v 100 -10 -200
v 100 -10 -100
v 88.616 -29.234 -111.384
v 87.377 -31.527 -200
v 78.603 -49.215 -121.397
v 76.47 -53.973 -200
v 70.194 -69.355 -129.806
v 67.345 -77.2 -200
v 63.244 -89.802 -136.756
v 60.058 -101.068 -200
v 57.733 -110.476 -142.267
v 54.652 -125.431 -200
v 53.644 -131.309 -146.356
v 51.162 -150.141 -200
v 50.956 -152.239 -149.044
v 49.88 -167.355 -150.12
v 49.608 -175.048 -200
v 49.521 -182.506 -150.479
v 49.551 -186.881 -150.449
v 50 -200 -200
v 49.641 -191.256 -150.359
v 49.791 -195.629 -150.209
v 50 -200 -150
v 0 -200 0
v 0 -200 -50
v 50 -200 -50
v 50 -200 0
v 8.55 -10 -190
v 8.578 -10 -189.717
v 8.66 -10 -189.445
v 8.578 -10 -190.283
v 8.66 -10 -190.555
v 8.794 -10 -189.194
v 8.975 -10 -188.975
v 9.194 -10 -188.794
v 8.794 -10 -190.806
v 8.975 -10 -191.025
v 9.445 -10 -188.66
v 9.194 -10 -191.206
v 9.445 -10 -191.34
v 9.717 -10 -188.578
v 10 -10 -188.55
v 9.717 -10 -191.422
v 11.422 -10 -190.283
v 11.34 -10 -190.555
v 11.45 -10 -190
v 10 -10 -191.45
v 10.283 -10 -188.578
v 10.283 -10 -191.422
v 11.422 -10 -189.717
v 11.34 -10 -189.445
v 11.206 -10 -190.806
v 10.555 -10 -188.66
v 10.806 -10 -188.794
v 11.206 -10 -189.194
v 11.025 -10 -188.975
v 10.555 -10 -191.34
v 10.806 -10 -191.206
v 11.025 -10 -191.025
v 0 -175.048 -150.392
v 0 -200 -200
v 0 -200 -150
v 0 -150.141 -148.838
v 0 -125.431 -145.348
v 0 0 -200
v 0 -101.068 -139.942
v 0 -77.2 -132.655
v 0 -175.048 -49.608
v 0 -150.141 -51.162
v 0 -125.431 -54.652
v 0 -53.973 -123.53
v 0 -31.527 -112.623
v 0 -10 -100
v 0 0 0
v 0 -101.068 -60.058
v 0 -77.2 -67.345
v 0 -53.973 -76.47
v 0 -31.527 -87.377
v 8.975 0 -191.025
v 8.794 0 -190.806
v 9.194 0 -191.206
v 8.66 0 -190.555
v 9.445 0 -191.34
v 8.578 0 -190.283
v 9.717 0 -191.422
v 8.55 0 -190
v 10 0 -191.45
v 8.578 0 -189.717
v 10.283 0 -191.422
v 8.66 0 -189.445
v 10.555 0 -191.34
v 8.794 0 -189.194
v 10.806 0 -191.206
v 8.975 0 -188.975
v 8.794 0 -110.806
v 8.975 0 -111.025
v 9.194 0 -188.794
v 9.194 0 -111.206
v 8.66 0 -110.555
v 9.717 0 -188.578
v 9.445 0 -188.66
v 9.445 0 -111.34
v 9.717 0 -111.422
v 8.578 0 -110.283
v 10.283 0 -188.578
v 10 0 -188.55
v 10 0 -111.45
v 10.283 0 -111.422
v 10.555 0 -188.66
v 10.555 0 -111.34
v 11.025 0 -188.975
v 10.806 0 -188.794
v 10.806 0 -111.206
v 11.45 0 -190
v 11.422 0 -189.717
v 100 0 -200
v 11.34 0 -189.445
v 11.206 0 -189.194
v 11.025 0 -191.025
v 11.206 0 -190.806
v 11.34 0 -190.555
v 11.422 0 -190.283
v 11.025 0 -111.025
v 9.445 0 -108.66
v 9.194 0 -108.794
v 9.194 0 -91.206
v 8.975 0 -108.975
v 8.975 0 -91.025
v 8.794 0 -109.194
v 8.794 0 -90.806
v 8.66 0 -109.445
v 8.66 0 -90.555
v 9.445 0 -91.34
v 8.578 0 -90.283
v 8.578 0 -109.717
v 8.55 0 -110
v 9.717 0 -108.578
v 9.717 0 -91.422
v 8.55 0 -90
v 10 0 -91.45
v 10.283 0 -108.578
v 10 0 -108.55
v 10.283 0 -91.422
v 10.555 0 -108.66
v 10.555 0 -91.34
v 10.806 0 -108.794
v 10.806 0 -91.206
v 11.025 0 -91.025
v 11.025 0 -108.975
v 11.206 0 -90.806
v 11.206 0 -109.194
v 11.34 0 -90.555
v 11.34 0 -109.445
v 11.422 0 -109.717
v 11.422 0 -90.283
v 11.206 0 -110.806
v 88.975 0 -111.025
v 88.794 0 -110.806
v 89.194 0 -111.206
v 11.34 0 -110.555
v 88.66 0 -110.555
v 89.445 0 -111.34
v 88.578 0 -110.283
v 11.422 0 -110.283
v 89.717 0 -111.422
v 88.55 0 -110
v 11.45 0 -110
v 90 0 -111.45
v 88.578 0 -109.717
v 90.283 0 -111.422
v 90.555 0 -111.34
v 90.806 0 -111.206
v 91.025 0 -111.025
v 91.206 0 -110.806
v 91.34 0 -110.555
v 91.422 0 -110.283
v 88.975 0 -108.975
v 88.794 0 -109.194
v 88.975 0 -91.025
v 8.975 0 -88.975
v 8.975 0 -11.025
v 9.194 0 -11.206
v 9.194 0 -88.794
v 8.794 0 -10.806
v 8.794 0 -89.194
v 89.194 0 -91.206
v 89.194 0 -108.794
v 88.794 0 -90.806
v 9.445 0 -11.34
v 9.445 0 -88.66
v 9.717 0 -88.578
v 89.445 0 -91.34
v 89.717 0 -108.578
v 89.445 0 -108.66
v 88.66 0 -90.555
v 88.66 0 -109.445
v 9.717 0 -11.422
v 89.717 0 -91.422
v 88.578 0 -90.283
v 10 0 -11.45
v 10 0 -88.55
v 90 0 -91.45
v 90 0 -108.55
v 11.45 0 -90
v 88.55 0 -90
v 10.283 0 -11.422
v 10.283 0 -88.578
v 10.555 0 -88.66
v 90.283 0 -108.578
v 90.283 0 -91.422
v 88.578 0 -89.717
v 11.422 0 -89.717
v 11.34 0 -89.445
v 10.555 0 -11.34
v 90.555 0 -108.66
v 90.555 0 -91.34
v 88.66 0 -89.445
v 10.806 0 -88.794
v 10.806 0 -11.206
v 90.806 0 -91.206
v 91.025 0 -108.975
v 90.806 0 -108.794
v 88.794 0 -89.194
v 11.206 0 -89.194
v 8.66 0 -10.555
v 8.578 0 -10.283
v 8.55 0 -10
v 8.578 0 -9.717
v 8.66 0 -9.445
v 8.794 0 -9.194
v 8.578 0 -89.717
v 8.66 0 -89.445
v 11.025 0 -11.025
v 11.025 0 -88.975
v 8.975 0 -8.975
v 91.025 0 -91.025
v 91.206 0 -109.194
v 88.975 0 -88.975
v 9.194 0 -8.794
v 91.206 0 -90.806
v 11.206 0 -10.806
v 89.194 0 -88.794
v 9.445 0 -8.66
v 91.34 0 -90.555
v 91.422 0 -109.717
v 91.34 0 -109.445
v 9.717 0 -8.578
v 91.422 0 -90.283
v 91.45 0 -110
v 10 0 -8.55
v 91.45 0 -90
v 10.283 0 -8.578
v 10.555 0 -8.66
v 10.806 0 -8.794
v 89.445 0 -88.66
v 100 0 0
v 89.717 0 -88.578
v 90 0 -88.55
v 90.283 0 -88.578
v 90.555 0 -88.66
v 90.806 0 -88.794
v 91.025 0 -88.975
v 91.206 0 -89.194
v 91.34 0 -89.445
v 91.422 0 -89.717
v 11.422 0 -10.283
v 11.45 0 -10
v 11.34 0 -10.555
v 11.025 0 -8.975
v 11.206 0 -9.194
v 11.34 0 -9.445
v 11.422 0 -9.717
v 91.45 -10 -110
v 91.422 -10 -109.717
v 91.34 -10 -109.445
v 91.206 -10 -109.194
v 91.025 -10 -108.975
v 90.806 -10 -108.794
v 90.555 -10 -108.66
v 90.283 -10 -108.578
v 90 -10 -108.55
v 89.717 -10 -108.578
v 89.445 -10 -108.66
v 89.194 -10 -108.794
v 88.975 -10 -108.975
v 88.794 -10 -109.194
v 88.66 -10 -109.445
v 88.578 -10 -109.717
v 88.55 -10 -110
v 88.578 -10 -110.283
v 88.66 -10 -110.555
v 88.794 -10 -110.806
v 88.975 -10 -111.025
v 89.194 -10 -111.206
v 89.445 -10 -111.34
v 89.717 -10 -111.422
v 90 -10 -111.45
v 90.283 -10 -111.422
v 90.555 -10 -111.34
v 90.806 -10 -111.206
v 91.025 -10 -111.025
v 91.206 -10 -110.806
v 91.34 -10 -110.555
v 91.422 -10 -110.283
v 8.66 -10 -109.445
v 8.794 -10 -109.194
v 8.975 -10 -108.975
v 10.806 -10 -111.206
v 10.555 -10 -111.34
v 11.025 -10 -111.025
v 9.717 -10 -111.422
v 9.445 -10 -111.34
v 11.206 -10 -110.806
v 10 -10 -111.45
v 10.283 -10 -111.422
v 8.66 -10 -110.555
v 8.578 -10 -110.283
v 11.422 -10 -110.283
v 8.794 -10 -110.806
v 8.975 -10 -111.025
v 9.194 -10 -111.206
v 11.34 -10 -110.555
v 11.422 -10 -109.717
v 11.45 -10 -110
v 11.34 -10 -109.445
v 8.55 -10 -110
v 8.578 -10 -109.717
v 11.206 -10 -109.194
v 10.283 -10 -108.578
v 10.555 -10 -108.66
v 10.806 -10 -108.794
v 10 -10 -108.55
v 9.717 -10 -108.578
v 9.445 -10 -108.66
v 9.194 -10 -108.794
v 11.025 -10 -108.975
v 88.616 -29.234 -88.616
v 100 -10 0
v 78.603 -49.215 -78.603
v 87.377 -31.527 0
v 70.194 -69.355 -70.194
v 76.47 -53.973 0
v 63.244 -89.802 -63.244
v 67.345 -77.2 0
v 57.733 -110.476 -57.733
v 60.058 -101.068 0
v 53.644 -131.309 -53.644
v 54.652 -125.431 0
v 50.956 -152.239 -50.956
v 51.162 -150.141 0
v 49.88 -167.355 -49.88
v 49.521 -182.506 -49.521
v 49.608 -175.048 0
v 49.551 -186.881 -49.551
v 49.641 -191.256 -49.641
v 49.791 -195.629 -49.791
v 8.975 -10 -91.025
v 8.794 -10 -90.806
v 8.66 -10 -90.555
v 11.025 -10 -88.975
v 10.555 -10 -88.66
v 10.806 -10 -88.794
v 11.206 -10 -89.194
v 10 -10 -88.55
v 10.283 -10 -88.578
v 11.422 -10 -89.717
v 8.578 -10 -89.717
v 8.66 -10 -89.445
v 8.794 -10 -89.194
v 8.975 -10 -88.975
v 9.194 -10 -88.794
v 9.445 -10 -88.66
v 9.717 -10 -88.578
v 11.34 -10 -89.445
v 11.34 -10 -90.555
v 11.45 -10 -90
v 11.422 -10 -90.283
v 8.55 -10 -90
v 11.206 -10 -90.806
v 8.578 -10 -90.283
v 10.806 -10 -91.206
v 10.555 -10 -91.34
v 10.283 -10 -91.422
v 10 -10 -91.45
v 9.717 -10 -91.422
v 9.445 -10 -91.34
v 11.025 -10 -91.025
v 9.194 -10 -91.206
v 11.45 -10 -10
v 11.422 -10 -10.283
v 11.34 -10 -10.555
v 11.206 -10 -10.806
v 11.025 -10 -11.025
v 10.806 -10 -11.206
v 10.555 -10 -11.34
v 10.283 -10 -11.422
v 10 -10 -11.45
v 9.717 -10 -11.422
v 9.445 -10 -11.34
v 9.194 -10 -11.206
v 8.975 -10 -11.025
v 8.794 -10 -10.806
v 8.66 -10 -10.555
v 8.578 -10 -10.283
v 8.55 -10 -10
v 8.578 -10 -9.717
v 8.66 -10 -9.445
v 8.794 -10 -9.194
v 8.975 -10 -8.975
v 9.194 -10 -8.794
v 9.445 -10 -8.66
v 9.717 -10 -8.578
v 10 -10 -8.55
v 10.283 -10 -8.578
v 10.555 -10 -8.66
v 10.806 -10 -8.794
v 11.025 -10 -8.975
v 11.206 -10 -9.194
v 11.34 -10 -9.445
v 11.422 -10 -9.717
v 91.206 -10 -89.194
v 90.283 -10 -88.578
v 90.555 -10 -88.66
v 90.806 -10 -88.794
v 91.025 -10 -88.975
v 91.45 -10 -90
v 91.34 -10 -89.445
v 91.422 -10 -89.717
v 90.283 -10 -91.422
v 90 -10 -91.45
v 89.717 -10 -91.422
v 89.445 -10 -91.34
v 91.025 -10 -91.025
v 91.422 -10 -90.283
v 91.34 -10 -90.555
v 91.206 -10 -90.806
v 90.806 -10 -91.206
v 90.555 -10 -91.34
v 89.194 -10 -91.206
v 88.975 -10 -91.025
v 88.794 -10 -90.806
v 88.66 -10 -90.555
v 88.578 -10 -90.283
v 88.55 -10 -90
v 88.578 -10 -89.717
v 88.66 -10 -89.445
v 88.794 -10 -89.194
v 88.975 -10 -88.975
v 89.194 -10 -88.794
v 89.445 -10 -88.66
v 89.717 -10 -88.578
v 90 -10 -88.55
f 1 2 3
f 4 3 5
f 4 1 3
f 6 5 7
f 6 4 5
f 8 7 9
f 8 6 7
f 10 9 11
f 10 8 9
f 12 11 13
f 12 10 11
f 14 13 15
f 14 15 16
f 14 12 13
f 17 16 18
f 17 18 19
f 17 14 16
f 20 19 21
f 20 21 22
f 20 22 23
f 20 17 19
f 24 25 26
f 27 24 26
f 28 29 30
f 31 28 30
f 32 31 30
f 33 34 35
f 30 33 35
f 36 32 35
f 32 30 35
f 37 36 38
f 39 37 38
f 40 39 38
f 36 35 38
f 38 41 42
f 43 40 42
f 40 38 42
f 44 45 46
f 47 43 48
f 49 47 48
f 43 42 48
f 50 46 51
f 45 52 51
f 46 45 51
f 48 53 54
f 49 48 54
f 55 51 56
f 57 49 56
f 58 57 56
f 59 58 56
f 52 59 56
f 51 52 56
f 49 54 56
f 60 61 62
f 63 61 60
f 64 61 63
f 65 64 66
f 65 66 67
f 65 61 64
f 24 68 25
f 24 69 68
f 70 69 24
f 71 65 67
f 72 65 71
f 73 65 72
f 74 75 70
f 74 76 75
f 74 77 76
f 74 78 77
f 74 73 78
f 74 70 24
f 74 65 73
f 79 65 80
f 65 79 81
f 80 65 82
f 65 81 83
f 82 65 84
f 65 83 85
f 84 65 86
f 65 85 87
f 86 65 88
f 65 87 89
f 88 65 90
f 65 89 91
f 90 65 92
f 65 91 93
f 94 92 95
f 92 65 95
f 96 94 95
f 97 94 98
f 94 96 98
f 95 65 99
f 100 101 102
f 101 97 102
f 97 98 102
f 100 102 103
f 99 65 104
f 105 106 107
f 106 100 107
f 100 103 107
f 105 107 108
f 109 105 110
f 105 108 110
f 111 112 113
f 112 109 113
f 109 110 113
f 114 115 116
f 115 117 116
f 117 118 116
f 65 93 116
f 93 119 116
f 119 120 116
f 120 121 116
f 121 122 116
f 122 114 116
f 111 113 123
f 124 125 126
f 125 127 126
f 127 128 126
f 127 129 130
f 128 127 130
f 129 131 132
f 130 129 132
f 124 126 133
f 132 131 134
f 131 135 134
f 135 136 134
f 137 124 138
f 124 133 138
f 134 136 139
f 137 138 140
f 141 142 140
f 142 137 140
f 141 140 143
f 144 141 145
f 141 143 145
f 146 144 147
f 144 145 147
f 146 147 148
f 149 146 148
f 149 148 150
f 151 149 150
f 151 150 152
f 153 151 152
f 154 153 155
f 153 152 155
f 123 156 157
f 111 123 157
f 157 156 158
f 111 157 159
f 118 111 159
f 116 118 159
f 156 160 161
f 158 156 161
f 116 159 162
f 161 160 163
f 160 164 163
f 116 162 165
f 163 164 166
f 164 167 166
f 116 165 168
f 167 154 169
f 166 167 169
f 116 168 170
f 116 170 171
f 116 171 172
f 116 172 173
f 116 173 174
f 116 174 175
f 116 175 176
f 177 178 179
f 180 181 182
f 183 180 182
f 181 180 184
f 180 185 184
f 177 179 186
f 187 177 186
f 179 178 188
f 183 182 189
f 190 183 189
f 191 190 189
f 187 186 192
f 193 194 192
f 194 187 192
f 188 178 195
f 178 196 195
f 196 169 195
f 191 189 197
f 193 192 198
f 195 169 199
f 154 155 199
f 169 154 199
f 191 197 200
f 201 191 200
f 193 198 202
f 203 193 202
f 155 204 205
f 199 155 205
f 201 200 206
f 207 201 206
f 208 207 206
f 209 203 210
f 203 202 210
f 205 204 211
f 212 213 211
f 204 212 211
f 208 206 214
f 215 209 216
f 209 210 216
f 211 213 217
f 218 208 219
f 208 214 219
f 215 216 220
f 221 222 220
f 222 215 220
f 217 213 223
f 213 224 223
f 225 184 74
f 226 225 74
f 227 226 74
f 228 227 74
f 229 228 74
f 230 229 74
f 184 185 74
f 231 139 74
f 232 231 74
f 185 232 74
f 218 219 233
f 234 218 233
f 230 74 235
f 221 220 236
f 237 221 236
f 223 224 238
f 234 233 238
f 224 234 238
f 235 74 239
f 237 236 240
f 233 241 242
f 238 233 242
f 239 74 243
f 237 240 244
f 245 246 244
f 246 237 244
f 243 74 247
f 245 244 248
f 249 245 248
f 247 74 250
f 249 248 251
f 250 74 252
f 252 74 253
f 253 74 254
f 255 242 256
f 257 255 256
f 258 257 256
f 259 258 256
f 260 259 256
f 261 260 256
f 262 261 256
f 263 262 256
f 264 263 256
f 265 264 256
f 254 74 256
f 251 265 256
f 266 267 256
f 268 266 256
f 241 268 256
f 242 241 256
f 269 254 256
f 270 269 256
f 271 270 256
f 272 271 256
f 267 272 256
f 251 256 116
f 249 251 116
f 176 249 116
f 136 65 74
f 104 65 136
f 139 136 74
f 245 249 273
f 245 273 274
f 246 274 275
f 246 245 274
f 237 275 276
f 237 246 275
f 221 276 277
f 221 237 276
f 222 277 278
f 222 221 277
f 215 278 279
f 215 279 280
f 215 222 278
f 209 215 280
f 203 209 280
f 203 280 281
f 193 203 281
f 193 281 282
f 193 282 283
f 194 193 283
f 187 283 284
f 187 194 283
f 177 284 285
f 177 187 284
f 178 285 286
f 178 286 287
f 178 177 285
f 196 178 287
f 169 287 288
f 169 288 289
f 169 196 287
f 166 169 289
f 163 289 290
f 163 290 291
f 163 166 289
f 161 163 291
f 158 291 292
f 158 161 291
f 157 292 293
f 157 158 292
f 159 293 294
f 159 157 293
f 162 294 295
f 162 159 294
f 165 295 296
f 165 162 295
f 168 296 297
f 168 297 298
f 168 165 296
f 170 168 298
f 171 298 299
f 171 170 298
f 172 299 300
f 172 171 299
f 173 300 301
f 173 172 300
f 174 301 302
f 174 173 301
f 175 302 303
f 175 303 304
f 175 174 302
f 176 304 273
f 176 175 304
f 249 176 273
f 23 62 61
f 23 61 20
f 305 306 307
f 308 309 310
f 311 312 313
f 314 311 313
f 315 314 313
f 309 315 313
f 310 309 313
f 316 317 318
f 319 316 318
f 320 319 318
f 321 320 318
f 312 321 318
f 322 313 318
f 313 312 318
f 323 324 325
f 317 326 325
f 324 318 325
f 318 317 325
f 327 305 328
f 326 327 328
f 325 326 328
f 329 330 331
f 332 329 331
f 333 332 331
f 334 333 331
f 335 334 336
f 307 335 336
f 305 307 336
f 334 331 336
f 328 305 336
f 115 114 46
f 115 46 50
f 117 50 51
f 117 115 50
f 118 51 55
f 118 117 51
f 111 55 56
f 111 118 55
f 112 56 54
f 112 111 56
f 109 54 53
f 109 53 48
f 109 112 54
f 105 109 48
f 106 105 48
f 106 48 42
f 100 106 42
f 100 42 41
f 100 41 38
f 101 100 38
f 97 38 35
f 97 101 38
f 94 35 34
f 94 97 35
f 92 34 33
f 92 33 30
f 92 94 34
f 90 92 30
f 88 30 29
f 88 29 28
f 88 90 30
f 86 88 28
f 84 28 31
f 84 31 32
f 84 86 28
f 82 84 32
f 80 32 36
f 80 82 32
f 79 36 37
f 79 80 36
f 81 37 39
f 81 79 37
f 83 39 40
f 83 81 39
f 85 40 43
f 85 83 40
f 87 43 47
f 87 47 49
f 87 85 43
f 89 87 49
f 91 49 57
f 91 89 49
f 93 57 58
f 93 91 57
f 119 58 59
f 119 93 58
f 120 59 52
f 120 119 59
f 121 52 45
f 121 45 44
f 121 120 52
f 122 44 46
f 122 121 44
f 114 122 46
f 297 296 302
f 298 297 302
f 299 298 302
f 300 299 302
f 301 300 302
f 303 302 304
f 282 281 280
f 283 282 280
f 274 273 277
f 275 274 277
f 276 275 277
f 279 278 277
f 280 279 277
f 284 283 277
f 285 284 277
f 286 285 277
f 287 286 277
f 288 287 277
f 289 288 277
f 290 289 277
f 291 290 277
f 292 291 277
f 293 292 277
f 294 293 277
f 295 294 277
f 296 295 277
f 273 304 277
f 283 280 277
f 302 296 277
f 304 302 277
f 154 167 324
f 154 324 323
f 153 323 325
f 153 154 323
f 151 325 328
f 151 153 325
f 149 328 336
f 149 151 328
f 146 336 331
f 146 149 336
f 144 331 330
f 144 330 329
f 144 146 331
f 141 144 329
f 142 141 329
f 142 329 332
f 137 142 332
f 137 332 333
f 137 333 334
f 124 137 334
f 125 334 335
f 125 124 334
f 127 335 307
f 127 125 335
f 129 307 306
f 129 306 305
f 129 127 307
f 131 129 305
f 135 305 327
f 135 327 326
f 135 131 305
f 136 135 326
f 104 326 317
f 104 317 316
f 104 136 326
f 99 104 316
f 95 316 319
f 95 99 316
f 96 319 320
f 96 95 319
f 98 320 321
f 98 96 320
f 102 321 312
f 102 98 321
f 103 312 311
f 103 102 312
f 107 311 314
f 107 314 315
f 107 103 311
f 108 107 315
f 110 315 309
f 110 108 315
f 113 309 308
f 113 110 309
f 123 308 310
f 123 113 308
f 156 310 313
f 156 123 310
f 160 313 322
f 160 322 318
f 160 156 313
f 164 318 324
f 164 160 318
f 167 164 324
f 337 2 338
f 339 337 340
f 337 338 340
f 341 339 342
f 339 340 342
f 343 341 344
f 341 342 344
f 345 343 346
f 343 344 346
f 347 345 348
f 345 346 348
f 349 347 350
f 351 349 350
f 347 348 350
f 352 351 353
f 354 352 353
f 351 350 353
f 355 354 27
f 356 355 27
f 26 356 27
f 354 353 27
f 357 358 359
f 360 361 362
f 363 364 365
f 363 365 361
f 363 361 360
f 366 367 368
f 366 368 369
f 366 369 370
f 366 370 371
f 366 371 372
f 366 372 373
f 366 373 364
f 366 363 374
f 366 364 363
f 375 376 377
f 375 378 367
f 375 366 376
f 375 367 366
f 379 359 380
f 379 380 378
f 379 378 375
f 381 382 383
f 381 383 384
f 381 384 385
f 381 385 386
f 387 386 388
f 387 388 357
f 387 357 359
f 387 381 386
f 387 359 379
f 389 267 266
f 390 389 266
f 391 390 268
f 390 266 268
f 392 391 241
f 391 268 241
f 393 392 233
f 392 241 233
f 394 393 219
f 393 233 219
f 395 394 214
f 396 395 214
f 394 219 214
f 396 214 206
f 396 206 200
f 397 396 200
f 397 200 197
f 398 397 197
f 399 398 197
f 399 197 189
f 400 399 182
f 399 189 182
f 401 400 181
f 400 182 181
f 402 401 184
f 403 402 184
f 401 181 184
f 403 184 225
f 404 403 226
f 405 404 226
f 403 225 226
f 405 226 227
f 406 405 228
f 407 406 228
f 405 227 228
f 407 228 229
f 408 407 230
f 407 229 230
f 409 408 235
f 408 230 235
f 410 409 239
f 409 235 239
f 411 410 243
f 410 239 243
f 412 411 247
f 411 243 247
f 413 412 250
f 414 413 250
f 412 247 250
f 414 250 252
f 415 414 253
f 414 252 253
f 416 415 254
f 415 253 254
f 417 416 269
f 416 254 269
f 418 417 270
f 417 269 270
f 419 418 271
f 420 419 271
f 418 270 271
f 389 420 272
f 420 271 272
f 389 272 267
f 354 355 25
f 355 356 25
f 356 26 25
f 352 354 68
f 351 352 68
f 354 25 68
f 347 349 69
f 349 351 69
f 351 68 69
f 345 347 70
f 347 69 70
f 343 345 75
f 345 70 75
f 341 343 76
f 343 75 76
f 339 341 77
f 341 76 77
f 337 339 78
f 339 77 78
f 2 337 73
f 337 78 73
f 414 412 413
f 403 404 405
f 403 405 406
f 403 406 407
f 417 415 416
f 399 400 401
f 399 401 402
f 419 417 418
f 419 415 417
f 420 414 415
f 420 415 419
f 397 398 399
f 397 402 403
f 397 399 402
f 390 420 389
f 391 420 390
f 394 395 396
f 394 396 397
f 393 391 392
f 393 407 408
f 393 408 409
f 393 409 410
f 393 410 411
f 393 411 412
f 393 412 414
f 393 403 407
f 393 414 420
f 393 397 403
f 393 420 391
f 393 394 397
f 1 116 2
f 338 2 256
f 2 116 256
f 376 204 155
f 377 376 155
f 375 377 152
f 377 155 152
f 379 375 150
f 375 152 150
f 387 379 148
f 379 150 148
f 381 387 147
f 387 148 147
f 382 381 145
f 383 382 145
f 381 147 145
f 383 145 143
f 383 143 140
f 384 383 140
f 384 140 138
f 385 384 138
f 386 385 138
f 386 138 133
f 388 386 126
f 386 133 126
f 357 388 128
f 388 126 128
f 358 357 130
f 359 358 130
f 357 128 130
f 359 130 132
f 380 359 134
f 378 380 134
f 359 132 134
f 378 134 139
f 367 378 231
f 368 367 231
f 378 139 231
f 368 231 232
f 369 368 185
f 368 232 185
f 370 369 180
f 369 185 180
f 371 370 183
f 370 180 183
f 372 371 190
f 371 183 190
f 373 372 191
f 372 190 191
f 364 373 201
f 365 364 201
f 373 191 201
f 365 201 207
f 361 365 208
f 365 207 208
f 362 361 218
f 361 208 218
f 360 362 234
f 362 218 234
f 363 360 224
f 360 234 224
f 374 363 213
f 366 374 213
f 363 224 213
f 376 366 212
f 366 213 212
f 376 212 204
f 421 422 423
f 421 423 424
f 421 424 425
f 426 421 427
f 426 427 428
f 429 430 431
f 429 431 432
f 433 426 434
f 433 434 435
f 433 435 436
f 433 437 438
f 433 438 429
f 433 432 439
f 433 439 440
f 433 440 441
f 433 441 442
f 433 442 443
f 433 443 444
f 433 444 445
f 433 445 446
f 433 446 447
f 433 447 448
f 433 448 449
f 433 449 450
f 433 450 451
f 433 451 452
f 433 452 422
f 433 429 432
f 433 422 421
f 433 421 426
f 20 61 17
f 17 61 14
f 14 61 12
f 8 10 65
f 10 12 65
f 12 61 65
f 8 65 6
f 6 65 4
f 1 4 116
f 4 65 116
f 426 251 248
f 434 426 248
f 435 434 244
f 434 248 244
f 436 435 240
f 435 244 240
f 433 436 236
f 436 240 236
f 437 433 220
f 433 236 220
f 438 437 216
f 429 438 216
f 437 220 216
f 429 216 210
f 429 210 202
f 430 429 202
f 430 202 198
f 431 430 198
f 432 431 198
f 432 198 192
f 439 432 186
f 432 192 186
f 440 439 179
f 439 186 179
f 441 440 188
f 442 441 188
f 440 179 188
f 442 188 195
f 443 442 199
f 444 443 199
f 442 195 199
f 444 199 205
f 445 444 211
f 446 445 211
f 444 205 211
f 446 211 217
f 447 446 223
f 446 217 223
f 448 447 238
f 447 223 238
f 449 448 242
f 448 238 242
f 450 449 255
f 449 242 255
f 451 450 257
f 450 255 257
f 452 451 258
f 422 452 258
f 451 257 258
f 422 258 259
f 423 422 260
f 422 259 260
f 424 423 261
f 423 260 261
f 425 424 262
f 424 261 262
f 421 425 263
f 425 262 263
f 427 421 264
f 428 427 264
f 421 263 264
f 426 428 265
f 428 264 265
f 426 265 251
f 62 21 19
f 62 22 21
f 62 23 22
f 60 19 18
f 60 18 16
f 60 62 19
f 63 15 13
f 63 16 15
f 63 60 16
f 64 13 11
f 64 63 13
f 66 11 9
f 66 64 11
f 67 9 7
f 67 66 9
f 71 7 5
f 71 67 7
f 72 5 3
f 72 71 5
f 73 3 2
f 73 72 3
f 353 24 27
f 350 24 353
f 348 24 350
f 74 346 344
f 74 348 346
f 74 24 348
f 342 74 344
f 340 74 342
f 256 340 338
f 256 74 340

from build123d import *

# Parameters (mm, degrees)
SKETCH1_W           = 100
SKETCH1_H           = 100
BOSS_EXTRUDE1_DEPTH = 200
CUT_EXTRUDE1_DEPTH  = 200
CUT_EXTRUDE2_DEPTH  = 200
SKETCH4_R           = 1.45
CUT_EXTRUDE3_DEPTH  = 10


with BuildPart() as part:
    # Sketch1 → Boss-Extrude1 (new body)
    with BuildSketch(Plane(origin=(0, 0, 0), x_dir=(1, 0, 0), z_dir=(0, 1, 0))):
        with Locations((50, 50)):
            Rectangle(SKETCH1_W, SKETCH1_H)
    extrude(amount=-BOSS_EXTRUDE1_DEPTH)

    # Sketch2 → Cut-Extrude1 (cut)
    with BuildSketch(Plane.XY):
        with BuildLine():
            ThreePointArc((100, -10), (60.05758303, -101.067785008), (50, -200))
            Line((50, -200), (100, -200))
            Line((100, -200), (100, -10))
        make_face()
    extrude(amount=-CUT_EXTRUDE1_DEPTH, mode=Mode.SUBTRACT)

    # Sketch3 → Cut-Extrude2 (cut)
    with BuildSketch(Plane.ZY):
        with BuildLine():
            ThreePointArc((-50, -200), (-60.05758303, -101.067785008), (-100, -10))
            Line((-100, -10), (-100, -200))
            Line((-100, -200), (-50, -200))
        make_face()
    extrude(amount=-CUT_EXTRUDE2_DEPTH, mode=Mode.SUBTRACT)

    # Sketch4 → Cut-Extrude3 (cut)
    with BuildSketch(Plane(origin=(0, 0, 0), x_dir=(1, 0, 0), z_dir=(0, 1, 0))):
        with Locations((10, 90)):
            Circle(SKETCH4_R)
        with Locations((90, 90)):
            Circle(SKETCH4_R)
        with Locations((10, 10)):
            Circle(SKETCH4_R)
    extrude(amount=-CUT_EXTRUDE3_DEPTH, mode=Mode.SUBTRACT)

    # Mirror1: part across plane


with BuildPart() as part_1:
    add(part.part)
    add(part.part.mirror(Plane(origin=(0, -200, -100), x_dir=(1, 0, 0), z_dir=(0, 0, -1))))


solid = part_1.part
